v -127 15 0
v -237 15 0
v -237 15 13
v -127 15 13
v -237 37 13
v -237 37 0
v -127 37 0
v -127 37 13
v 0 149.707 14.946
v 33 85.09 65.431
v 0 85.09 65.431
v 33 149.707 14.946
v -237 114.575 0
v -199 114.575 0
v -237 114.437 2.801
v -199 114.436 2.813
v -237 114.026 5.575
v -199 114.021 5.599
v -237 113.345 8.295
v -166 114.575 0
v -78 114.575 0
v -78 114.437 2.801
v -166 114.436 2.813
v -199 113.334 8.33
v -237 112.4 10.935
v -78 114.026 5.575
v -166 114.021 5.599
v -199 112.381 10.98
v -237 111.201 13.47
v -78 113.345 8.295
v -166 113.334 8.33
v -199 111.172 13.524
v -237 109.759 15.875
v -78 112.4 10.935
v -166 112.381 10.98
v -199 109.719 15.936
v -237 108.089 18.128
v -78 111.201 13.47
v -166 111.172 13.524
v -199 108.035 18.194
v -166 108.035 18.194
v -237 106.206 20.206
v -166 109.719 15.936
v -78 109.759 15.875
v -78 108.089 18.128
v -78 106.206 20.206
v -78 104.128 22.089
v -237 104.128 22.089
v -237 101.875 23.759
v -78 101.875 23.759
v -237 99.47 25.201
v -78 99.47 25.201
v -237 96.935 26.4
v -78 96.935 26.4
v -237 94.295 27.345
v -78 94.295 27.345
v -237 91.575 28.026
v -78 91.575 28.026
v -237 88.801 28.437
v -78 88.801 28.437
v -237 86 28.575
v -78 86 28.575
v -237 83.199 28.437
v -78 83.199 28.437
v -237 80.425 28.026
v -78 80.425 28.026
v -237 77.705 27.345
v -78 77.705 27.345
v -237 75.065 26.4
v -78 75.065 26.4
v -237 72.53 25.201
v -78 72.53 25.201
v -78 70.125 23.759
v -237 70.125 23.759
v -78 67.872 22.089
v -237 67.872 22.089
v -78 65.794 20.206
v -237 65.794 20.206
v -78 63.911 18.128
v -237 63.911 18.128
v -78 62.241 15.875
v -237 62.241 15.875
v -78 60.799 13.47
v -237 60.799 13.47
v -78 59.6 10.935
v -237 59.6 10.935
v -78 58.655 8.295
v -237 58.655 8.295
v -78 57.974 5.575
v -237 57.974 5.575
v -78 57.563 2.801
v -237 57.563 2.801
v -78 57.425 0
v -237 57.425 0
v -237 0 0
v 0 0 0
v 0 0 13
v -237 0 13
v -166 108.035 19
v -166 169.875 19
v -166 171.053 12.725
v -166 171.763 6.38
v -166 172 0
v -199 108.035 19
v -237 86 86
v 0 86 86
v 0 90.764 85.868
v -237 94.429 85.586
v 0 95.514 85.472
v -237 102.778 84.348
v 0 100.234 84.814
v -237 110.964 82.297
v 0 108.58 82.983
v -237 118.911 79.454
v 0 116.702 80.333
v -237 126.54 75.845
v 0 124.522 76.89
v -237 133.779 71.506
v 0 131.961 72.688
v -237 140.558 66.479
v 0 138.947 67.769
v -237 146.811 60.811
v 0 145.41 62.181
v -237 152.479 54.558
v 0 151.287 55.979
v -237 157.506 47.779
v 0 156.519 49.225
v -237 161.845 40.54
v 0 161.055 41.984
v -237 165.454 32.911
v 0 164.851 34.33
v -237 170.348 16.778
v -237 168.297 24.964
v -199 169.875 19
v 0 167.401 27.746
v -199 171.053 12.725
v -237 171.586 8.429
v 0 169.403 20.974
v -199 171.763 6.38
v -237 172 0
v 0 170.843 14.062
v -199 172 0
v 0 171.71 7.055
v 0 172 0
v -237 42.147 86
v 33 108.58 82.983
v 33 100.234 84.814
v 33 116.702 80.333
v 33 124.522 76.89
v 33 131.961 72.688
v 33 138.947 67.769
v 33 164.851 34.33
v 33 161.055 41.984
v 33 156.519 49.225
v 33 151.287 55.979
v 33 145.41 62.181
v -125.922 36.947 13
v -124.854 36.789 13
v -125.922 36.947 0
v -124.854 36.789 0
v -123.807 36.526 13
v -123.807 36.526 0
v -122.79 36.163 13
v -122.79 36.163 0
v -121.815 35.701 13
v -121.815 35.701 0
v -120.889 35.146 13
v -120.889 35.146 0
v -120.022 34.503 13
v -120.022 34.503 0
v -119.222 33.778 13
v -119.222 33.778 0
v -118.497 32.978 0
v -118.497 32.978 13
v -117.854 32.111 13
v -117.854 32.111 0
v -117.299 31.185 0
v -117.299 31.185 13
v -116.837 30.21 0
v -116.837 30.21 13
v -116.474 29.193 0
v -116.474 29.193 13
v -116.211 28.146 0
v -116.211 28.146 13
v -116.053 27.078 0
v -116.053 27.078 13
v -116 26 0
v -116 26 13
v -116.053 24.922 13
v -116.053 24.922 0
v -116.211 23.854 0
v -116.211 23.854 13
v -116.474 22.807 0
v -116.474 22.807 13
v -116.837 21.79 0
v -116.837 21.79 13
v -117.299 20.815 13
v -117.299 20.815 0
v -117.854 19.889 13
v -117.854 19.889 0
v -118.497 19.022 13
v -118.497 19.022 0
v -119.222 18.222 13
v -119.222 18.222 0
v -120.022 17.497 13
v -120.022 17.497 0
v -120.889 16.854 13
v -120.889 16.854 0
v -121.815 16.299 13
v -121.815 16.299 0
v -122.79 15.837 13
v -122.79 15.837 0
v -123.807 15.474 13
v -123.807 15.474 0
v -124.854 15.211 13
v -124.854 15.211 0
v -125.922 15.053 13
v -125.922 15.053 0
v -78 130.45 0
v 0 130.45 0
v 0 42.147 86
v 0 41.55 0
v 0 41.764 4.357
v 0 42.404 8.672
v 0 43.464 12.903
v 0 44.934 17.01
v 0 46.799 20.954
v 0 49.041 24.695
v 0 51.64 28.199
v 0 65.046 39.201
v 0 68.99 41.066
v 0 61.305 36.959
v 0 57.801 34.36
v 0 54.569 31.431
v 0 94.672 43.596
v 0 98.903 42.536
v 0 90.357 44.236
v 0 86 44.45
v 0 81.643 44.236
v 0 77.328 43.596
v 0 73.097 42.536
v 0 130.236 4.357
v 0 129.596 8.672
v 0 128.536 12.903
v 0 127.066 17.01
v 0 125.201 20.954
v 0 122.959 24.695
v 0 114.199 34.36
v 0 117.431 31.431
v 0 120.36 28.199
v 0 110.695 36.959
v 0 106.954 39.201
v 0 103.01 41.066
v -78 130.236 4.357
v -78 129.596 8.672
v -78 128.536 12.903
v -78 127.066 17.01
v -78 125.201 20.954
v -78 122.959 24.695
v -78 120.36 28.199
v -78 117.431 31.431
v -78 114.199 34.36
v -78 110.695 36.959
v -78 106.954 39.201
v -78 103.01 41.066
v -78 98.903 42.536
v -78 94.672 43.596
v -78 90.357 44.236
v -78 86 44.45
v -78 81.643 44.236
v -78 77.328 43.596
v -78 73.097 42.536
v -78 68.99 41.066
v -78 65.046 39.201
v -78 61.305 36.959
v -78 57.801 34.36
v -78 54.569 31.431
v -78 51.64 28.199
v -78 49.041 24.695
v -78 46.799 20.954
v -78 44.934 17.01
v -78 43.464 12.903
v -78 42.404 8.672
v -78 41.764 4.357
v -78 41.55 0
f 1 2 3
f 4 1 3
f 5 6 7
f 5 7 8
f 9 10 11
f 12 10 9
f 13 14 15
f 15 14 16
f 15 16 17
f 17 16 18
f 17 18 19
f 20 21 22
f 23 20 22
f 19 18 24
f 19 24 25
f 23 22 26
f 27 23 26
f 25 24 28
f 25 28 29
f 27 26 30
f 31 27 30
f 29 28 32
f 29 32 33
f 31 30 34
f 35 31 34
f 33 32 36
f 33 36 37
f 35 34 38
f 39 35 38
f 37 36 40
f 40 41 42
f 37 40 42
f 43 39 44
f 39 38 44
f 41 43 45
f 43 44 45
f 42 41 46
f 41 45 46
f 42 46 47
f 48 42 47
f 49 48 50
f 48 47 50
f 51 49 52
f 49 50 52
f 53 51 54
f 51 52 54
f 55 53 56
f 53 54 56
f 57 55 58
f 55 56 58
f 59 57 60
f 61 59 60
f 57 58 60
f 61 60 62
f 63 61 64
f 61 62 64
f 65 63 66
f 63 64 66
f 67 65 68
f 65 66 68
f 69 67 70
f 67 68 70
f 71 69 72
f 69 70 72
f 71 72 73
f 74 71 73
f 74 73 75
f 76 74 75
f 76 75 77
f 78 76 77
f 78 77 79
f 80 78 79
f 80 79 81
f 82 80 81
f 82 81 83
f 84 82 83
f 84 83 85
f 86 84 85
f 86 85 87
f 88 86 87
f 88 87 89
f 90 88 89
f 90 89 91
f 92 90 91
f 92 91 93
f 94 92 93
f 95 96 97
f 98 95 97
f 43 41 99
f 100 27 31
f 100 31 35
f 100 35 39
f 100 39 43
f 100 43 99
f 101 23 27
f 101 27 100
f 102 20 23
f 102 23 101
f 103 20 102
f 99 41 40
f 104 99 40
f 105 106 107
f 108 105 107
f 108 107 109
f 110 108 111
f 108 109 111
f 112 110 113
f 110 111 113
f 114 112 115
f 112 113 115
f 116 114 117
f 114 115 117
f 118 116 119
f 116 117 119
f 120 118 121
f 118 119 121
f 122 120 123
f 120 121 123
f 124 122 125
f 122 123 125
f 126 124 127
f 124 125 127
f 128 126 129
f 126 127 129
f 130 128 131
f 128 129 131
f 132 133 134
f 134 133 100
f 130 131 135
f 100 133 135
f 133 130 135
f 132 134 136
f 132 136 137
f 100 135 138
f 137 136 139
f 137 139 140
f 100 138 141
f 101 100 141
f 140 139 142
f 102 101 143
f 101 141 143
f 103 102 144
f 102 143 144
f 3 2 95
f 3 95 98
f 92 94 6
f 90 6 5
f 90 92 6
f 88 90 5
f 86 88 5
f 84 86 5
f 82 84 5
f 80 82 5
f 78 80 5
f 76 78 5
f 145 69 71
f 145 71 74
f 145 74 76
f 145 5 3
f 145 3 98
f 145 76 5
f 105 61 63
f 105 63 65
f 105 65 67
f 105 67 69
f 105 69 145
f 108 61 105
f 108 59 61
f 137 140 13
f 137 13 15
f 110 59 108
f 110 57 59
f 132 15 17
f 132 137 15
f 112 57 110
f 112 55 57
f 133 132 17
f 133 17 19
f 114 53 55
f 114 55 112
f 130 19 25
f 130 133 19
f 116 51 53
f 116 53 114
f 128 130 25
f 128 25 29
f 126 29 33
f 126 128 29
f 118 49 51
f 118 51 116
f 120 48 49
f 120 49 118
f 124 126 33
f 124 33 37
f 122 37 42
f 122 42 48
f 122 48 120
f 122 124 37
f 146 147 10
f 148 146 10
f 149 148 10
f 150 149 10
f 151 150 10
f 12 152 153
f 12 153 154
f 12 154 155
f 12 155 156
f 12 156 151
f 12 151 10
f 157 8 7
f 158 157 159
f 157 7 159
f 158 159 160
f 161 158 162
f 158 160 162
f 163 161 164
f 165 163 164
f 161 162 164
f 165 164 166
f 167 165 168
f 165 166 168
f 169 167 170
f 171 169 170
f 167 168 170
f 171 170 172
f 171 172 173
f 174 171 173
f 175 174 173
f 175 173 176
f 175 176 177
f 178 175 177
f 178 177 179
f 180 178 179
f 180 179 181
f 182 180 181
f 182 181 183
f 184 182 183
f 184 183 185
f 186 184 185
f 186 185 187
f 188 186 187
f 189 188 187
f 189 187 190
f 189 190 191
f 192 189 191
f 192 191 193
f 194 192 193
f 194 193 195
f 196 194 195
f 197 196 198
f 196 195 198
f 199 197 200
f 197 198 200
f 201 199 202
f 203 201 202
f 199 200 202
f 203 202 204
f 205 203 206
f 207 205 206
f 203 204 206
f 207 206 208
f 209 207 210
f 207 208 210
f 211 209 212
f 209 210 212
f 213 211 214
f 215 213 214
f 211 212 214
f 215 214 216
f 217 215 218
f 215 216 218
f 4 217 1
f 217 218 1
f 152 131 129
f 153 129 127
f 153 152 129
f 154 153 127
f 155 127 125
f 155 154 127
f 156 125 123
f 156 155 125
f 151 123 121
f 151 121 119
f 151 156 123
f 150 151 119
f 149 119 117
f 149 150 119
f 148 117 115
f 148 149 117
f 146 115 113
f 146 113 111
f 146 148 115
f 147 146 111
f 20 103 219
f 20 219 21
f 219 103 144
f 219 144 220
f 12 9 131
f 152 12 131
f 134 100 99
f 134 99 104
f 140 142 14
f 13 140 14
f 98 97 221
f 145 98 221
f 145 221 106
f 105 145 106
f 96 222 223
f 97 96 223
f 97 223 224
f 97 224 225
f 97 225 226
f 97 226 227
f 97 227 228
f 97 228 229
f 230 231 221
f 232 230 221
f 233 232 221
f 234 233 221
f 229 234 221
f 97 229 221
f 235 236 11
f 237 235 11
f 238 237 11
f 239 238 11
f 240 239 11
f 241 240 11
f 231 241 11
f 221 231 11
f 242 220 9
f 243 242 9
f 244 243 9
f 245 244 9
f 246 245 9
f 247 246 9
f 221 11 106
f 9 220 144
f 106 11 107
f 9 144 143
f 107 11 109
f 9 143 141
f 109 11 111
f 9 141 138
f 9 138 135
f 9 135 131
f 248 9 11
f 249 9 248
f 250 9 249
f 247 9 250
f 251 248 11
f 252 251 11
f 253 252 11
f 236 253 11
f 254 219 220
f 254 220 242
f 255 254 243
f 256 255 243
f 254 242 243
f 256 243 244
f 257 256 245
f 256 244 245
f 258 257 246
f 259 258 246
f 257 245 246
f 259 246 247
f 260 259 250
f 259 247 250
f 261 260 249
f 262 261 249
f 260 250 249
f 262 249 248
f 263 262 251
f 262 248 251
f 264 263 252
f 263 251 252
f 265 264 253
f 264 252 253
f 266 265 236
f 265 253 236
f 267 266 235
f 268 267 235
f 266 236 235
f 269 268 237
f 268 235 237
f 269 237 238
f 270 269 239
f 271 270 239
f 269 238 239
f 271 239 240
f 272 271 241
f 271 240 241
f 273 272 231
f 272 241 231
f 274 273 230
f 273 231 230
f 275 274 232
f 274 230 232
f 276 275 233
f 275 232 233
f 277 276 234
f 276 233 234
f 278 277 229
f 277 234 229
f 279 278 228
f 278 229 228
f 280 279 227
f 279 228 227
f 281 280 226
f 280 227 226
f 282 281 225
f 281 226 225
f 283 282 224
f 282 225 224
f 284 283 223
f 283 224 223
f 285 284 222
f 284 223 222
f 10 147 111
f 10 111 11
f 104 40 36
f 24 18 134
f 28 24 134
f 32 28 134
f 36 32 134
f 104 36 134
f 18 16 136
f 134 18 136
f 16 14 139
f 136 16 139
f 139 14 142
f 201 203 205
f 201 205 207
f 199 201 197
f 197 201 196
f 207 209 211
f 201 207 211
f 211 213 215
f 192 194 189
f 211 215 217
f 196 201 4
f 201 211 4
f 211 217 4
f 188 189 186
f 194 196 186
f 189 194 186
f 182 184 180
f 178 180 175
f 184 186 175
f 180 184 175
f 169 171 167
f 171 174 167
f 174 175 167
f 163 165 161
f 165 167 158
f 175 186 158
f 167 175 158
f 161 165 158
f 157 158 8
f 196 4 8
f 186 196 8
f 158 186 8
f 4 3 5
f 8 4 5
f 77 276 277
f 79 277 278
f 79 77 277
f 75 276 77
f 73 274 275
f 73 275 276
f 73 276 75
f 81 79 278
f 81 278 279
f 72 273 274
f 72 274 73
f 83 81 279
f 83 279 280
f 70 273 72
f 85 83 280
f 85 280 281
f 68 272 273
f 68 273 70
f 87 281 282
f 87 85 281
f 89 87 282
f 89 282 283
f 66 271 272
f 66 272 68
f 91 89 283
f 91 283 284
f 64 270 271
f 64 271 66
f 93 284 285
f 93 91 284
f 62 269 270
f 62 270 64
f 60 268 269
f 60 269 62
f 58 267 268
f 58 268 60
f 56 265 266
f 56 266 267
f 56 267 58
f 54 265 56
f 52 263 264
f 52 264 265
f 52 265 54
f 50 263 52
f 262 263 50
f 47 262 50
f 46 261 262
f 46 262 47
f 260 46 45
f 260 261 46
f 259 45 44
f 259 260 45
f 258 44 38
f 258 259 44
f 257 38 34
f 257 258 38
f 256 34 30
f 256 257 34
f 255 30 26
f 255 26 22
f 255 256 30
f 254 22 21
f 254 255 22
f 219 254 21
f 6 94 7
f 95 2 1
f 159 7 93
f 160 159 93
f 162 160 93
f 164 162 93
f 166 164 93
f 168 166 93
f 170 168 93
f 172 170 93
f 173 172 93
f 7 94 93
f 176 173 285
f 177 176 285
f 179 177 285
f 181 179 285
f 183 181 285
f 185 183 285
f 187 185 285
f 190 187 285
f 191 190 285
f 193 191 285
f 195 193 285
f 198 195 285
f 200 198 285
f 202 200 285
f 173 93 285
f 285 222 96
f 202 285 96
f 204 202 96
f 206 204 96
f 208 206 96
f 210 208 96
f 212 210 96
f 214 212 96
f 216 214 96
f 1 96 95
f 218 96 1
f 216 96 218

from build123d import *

# Parameters (mm, degrees)
EXTRUDE_9_DEPTH     = 237
CUT_EXTRUDE_3_DEPTH = 78
SKETCH_12_W         = 13
SKETCH_12_H         = 22
CUT_EXTRUDE_5_DEPTH = 110
SKETCH_13_R         = 11
CUT_EXTRUDE_6_DEPTH = 13
SKETCH_14_W         = 33
SKETCH_14_H         = 63.965487913
CUT_EXTRUDE_9_DEPTH = 19
EXTRUDE_START       = 33
EXTRUDE_11_DEPTH    = 33


with BuildPart() as part:
    # 草图1 → 凸台-拉伸9 (new body)
    with BuildSketch(Plane(origin=(0, 0, 0), x_dir=(0, 0, -1), z_dir=(1, 0, 0))):
        with BuildLine():
            Line((0, 172), (0, 114.575))
            ThreePointArc((0, 114.575), (-28.575, 86), (0, 57.425))
            Line((0, 57.425), (0, 0))
            Line((0, 0), (-13, 0))
            Line((-13, 0), (-86, 42.146569651))
            Line((-86, 42.146569651), (-86, 86))
            ThreePointArc((-86, 86), (-60.811183182, 146.811183182), (0, 172))
        make_face()
    extrude(amount=-EXTRUDE_9_DEPTH)

    # 草图1<13> → 切除-拉伸3 (cut)
    with BuildSketch(Plane(origin=(0, 0, 0), x_dir=(0, 0, -1), z_dir=(1, 0, 0))):
        with BuildLine():
            Line((0, 114.575), (0, 130.45))
            ThreePointArc((0, 130.45), (-44.45, 86), (0, 41.55))
            Line((0, 41.55), (0, 57.425))
            ThreePointArc((0, 57.425), (-28.575, 86), (0, 114.575))
        make_face()
    extrude(amount=-CUT_EXTRUDE_3_DEPTH, mode=Mode.SUBTRACT)

    # 草图12 → 切除-拉伸5 (cut)
    with BuildSketch(Plane.ZY.offset(237)):
        with Locations((6.5, 26)):
            Rectangle(SKETCH_12_W, SKETCH_12_H)
    extrude(amount=-CUT_EXTRUDE_5_DEPTH, mode=Mode.SUBTRACT)

    # 草图13 → 切除-拉伸6 (cut)
    with BuildSketch(Plane(origin=(0, 0, 0), x_dir=(-1, 0, 0), z_dir=(0, 0, -1))):
        with Locations((127, 26)):
            Circle(SKETCH_13_R)
    extrude(amount=-CUT_EXTRUDE_6_DEPTH, mode=Mode.SUBTRACT)

    # 草图14 → 切除-拉伸9 (cut)
    with BuildSketch(Plane(origin=(0, 0, 0), x_dir=(-1, 0, 0), z_dir=(0, 0, -1))):
        with Locations((182.5, 140.017256043)):
            Rectangle(SKETCH_14_W, SKETCH_14_H)
    extrude(amount=-CUT_EXTRUDE_9_DEPTH, mode=Mode.SUBTRACT)

    # 草图10 → 凸台-拉伸11 (add)
    with BuildSketch(Plane(origin=(0, 0, 0), x_dir=(0, 0, -1), z_dir=(1, 0, 0)).offset(EXTRUDE_START)):
        with BuildLine():
            Line((-84.813857215, 100.234100753), (-65.430668922, 85.090294344))
            Line((-65.430668922, 85.090294344), (-14.946427946, 149.707176139))
            Line((-14.946427946, 149.707176139), (-34.329616239, 164.850982549))
            ThreePointArc((-34.329616239, 164.850982549), (-67.76892481, 138.946886878), (-84.813857215, 100.234100753))
        make_face()
    extrude(amount=-EXTRUDE_11_DEPTH)


solid = part.part
